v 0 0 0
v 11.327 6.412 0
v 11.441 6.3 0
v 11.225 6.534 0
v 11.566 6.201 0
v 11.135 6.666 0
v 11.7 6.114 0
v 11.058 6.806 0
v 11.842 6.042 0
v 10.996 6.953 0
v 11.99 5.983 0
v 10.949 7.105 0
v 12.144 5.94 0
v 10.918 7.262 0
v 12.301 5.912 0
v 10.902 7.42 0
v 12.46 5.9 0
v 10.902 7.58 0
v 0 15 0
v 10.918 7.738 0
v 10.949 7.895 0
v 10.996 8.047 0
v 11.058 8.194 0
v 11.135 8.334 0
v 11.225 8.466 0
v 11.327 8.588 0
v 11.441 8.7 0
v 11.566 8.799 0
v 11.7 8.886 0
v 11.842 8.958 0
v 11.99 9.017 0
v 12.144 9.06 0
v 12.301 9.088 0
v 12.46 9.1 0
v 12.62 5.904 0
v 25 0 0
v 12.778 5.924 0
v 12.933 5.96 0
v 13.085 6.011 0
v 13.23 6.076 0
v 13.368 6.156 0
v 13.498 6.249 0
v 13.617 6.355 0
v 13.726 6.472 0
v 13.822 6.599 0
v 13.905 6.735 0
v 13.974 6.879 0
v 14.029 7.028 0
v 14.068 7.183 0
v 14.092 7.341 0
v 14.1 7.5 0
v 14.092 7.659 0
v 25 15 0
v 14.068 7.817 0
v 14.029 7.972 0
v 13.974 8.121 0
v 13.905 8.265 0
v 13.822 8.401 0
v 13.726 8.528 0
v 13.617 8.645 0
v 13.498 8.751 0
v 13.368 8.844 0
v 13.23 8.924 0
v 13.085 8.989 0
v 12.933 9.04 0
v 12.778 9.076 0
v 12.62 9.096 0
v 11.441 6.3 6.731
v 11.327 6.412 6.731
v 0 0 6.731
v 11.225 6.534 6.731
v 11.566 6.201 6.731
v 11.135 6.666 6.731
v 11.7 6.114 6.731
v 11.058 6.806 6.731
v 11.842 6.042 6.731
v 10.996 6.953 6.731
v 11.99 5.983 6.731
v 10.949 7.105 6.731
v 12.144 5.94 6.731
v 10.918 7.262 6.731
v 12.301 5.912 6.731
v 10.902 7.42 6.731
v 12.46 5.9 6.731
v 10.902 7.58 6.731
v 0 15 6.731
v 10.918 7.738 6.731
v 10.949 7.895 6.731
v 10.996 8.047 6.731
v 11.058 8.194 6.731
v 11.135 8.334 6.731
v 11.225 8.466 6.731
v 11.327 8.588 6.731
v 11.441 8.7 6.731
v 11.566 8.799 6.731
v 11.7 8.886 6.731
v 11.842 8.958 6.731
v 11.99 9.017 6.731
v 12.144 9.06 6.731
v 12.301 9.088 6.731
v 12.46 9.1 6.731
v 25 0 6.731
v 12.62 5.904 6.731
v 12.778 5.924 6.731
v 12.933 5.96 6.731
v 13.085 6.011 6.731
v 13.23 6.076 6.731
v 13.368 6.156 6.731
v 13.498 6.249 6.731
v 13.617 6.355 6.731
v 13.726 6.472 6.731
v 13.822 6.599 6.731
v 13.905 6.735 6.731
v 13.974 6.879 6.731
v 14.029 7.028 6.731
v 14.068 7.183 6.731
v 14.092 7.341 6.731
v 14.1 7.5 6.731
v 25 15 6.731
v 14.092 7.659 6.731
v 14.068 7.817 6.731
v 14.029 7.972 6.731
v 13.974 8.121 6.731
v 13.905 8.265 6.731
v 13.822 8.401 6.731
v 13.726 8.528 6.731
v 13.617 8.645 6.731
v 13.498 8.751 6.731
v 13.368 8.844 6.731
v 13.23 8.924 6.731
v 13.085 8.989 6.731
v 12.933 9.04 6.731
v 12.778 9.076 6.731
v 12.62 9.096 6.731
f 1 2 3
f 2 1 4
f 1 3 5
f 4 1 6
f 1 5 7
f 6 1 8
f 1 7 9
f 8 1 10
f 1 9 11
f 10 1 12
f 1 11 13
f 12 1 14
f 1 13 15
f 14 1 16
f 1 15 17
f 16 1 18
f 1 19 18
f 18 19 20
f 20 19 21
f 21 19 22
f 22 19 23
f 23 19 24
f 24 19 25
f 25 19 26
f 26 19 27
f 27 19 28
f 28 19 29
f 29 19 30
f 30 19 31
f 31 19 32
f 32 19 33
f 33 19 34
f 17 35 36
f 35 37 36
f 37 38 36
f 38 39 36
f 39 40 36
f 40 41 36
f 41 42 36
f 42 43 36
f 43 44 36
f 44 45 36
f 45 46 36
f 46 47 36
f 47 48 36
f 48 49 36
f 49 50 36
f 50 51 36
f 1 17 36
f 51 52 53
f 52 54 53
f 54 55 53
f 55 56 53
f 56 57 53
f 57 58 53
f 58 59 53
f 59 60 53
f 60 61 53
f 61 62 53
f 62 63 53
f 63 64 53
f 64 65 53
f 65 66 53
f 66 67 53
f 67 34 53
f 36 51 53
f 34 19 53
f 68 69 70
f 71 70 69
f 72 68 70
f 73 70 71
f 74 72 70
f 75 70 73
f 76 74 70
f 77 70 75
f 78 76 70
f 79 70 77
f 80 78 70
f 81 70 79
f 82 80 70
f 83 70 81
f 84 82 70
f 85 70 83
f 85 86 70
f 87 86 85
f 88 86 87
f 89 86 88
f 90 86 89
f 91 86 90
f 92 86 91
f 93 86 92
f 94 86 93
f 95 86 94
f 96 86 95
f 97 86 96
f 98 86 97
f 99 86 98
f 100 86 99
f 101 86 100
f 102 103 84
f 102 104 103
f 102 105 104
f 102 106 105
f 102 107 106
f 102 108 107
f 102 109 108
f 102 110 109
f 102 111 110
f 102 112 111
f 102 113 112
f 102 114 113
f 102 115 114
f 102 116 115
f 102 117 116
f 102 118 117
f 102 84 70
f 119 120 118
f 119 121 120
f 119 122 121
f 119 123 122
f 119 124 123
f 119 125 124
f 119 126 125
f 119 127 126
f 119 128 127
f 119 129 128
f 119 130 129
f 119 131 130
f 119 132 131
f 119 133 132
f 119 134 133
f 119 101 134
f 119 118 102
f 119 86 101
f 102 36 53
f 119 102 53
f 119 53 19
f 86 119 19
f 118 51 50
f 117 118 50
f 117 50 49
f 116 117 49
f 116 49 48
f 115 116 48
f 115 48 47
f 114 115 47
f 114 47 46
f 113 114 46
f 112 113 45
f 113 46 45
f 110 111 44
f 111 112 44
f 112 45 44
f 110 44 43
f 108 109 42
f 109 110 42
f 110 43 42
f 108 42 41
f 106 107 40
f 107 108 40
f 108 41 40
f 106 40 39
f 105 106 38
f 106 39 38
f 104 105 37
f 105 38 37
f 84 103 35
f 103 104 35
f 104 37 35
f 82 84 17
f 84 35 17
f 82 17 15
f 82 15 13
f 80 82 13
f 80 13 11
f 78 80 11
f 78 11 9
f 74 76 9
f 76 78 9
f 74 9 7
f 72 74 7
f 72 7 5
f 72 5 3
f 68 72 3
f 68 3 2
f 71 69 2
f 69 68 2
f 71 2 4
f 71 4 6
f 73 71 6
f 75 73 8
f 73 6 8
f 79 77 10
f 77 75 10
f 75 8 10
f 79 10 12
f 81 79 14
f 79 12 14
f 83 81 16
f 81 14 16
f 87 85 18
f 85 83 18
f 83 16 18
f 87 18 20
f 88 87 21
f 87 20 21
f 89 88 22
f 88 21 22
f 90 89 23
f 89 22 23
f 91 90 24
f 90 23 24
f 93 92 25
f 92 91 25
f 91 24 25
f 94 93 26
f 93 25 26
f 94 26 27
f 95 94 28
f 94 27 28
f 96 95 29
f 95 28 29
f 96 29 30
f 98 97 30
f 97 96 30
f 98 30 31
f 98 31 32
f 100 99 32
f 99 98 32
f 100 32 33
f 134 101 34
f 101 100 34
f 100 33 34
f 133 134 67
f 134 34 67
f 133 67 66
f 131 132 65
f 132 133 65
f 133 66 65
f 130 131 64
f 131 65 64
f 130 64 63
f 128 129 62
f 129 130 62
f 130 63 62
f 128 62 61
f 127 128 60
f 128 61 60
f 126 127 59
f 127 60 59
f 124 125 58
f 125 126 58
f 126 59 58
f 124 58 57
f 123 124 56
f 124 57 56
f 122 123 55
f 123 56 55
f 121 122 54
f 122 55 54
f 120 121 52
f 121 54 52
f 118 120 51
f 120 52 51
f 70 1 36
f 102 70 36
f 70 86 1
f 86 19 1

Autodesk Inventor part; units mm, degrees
ref_plane "YZ Plane" through (0, 0, 0) normal (1, 0, 0) x (0, 1, 0)
ref_plane "XZ Plane" through (0, 0, 0) normal (0, 1, 0) x (-1, 0, 0)
ref_plane "XY Plane" through (0, 0, 0) normal (0, 0, 1) x (1, 0, 0)
sketch "Sketch1" plane through (0, 0, 0) normal (0, 0, 1) x (1, 0, 0)
  line L0 (0, 0) -> (25, 0)
  line L1 (25, 0) -> (25, 15)
  line L2 (25, 15) -> (0, 15)
  line L3 (0, 15) -> (0, 0)
  circle A0 centre (12.5, 7.5) radius 1.6
  point P0 (0, 7.5)
  point P1 (12.5, 15)
  dimension "d1" = 15
  dimension "d2" = 25
  dimension "d4" = 3.2
extrude "Extrusion1" add sketch "Sketch1" along normal blind 6.731
equation "\"d10\" = THICKB"
equation "\"THICKA\" = 3.175"
equation "\"THICKB\" = 6.731"
equation "\"THICKC\" = 12.7"
equation "\"MAGDIA\" = 9.5"
equation "\"BALLDIA\" = 12"
equation "\"THICKPLY\" = 5"
properties part number "Frame_Upper_Plate_Pulley_B"
